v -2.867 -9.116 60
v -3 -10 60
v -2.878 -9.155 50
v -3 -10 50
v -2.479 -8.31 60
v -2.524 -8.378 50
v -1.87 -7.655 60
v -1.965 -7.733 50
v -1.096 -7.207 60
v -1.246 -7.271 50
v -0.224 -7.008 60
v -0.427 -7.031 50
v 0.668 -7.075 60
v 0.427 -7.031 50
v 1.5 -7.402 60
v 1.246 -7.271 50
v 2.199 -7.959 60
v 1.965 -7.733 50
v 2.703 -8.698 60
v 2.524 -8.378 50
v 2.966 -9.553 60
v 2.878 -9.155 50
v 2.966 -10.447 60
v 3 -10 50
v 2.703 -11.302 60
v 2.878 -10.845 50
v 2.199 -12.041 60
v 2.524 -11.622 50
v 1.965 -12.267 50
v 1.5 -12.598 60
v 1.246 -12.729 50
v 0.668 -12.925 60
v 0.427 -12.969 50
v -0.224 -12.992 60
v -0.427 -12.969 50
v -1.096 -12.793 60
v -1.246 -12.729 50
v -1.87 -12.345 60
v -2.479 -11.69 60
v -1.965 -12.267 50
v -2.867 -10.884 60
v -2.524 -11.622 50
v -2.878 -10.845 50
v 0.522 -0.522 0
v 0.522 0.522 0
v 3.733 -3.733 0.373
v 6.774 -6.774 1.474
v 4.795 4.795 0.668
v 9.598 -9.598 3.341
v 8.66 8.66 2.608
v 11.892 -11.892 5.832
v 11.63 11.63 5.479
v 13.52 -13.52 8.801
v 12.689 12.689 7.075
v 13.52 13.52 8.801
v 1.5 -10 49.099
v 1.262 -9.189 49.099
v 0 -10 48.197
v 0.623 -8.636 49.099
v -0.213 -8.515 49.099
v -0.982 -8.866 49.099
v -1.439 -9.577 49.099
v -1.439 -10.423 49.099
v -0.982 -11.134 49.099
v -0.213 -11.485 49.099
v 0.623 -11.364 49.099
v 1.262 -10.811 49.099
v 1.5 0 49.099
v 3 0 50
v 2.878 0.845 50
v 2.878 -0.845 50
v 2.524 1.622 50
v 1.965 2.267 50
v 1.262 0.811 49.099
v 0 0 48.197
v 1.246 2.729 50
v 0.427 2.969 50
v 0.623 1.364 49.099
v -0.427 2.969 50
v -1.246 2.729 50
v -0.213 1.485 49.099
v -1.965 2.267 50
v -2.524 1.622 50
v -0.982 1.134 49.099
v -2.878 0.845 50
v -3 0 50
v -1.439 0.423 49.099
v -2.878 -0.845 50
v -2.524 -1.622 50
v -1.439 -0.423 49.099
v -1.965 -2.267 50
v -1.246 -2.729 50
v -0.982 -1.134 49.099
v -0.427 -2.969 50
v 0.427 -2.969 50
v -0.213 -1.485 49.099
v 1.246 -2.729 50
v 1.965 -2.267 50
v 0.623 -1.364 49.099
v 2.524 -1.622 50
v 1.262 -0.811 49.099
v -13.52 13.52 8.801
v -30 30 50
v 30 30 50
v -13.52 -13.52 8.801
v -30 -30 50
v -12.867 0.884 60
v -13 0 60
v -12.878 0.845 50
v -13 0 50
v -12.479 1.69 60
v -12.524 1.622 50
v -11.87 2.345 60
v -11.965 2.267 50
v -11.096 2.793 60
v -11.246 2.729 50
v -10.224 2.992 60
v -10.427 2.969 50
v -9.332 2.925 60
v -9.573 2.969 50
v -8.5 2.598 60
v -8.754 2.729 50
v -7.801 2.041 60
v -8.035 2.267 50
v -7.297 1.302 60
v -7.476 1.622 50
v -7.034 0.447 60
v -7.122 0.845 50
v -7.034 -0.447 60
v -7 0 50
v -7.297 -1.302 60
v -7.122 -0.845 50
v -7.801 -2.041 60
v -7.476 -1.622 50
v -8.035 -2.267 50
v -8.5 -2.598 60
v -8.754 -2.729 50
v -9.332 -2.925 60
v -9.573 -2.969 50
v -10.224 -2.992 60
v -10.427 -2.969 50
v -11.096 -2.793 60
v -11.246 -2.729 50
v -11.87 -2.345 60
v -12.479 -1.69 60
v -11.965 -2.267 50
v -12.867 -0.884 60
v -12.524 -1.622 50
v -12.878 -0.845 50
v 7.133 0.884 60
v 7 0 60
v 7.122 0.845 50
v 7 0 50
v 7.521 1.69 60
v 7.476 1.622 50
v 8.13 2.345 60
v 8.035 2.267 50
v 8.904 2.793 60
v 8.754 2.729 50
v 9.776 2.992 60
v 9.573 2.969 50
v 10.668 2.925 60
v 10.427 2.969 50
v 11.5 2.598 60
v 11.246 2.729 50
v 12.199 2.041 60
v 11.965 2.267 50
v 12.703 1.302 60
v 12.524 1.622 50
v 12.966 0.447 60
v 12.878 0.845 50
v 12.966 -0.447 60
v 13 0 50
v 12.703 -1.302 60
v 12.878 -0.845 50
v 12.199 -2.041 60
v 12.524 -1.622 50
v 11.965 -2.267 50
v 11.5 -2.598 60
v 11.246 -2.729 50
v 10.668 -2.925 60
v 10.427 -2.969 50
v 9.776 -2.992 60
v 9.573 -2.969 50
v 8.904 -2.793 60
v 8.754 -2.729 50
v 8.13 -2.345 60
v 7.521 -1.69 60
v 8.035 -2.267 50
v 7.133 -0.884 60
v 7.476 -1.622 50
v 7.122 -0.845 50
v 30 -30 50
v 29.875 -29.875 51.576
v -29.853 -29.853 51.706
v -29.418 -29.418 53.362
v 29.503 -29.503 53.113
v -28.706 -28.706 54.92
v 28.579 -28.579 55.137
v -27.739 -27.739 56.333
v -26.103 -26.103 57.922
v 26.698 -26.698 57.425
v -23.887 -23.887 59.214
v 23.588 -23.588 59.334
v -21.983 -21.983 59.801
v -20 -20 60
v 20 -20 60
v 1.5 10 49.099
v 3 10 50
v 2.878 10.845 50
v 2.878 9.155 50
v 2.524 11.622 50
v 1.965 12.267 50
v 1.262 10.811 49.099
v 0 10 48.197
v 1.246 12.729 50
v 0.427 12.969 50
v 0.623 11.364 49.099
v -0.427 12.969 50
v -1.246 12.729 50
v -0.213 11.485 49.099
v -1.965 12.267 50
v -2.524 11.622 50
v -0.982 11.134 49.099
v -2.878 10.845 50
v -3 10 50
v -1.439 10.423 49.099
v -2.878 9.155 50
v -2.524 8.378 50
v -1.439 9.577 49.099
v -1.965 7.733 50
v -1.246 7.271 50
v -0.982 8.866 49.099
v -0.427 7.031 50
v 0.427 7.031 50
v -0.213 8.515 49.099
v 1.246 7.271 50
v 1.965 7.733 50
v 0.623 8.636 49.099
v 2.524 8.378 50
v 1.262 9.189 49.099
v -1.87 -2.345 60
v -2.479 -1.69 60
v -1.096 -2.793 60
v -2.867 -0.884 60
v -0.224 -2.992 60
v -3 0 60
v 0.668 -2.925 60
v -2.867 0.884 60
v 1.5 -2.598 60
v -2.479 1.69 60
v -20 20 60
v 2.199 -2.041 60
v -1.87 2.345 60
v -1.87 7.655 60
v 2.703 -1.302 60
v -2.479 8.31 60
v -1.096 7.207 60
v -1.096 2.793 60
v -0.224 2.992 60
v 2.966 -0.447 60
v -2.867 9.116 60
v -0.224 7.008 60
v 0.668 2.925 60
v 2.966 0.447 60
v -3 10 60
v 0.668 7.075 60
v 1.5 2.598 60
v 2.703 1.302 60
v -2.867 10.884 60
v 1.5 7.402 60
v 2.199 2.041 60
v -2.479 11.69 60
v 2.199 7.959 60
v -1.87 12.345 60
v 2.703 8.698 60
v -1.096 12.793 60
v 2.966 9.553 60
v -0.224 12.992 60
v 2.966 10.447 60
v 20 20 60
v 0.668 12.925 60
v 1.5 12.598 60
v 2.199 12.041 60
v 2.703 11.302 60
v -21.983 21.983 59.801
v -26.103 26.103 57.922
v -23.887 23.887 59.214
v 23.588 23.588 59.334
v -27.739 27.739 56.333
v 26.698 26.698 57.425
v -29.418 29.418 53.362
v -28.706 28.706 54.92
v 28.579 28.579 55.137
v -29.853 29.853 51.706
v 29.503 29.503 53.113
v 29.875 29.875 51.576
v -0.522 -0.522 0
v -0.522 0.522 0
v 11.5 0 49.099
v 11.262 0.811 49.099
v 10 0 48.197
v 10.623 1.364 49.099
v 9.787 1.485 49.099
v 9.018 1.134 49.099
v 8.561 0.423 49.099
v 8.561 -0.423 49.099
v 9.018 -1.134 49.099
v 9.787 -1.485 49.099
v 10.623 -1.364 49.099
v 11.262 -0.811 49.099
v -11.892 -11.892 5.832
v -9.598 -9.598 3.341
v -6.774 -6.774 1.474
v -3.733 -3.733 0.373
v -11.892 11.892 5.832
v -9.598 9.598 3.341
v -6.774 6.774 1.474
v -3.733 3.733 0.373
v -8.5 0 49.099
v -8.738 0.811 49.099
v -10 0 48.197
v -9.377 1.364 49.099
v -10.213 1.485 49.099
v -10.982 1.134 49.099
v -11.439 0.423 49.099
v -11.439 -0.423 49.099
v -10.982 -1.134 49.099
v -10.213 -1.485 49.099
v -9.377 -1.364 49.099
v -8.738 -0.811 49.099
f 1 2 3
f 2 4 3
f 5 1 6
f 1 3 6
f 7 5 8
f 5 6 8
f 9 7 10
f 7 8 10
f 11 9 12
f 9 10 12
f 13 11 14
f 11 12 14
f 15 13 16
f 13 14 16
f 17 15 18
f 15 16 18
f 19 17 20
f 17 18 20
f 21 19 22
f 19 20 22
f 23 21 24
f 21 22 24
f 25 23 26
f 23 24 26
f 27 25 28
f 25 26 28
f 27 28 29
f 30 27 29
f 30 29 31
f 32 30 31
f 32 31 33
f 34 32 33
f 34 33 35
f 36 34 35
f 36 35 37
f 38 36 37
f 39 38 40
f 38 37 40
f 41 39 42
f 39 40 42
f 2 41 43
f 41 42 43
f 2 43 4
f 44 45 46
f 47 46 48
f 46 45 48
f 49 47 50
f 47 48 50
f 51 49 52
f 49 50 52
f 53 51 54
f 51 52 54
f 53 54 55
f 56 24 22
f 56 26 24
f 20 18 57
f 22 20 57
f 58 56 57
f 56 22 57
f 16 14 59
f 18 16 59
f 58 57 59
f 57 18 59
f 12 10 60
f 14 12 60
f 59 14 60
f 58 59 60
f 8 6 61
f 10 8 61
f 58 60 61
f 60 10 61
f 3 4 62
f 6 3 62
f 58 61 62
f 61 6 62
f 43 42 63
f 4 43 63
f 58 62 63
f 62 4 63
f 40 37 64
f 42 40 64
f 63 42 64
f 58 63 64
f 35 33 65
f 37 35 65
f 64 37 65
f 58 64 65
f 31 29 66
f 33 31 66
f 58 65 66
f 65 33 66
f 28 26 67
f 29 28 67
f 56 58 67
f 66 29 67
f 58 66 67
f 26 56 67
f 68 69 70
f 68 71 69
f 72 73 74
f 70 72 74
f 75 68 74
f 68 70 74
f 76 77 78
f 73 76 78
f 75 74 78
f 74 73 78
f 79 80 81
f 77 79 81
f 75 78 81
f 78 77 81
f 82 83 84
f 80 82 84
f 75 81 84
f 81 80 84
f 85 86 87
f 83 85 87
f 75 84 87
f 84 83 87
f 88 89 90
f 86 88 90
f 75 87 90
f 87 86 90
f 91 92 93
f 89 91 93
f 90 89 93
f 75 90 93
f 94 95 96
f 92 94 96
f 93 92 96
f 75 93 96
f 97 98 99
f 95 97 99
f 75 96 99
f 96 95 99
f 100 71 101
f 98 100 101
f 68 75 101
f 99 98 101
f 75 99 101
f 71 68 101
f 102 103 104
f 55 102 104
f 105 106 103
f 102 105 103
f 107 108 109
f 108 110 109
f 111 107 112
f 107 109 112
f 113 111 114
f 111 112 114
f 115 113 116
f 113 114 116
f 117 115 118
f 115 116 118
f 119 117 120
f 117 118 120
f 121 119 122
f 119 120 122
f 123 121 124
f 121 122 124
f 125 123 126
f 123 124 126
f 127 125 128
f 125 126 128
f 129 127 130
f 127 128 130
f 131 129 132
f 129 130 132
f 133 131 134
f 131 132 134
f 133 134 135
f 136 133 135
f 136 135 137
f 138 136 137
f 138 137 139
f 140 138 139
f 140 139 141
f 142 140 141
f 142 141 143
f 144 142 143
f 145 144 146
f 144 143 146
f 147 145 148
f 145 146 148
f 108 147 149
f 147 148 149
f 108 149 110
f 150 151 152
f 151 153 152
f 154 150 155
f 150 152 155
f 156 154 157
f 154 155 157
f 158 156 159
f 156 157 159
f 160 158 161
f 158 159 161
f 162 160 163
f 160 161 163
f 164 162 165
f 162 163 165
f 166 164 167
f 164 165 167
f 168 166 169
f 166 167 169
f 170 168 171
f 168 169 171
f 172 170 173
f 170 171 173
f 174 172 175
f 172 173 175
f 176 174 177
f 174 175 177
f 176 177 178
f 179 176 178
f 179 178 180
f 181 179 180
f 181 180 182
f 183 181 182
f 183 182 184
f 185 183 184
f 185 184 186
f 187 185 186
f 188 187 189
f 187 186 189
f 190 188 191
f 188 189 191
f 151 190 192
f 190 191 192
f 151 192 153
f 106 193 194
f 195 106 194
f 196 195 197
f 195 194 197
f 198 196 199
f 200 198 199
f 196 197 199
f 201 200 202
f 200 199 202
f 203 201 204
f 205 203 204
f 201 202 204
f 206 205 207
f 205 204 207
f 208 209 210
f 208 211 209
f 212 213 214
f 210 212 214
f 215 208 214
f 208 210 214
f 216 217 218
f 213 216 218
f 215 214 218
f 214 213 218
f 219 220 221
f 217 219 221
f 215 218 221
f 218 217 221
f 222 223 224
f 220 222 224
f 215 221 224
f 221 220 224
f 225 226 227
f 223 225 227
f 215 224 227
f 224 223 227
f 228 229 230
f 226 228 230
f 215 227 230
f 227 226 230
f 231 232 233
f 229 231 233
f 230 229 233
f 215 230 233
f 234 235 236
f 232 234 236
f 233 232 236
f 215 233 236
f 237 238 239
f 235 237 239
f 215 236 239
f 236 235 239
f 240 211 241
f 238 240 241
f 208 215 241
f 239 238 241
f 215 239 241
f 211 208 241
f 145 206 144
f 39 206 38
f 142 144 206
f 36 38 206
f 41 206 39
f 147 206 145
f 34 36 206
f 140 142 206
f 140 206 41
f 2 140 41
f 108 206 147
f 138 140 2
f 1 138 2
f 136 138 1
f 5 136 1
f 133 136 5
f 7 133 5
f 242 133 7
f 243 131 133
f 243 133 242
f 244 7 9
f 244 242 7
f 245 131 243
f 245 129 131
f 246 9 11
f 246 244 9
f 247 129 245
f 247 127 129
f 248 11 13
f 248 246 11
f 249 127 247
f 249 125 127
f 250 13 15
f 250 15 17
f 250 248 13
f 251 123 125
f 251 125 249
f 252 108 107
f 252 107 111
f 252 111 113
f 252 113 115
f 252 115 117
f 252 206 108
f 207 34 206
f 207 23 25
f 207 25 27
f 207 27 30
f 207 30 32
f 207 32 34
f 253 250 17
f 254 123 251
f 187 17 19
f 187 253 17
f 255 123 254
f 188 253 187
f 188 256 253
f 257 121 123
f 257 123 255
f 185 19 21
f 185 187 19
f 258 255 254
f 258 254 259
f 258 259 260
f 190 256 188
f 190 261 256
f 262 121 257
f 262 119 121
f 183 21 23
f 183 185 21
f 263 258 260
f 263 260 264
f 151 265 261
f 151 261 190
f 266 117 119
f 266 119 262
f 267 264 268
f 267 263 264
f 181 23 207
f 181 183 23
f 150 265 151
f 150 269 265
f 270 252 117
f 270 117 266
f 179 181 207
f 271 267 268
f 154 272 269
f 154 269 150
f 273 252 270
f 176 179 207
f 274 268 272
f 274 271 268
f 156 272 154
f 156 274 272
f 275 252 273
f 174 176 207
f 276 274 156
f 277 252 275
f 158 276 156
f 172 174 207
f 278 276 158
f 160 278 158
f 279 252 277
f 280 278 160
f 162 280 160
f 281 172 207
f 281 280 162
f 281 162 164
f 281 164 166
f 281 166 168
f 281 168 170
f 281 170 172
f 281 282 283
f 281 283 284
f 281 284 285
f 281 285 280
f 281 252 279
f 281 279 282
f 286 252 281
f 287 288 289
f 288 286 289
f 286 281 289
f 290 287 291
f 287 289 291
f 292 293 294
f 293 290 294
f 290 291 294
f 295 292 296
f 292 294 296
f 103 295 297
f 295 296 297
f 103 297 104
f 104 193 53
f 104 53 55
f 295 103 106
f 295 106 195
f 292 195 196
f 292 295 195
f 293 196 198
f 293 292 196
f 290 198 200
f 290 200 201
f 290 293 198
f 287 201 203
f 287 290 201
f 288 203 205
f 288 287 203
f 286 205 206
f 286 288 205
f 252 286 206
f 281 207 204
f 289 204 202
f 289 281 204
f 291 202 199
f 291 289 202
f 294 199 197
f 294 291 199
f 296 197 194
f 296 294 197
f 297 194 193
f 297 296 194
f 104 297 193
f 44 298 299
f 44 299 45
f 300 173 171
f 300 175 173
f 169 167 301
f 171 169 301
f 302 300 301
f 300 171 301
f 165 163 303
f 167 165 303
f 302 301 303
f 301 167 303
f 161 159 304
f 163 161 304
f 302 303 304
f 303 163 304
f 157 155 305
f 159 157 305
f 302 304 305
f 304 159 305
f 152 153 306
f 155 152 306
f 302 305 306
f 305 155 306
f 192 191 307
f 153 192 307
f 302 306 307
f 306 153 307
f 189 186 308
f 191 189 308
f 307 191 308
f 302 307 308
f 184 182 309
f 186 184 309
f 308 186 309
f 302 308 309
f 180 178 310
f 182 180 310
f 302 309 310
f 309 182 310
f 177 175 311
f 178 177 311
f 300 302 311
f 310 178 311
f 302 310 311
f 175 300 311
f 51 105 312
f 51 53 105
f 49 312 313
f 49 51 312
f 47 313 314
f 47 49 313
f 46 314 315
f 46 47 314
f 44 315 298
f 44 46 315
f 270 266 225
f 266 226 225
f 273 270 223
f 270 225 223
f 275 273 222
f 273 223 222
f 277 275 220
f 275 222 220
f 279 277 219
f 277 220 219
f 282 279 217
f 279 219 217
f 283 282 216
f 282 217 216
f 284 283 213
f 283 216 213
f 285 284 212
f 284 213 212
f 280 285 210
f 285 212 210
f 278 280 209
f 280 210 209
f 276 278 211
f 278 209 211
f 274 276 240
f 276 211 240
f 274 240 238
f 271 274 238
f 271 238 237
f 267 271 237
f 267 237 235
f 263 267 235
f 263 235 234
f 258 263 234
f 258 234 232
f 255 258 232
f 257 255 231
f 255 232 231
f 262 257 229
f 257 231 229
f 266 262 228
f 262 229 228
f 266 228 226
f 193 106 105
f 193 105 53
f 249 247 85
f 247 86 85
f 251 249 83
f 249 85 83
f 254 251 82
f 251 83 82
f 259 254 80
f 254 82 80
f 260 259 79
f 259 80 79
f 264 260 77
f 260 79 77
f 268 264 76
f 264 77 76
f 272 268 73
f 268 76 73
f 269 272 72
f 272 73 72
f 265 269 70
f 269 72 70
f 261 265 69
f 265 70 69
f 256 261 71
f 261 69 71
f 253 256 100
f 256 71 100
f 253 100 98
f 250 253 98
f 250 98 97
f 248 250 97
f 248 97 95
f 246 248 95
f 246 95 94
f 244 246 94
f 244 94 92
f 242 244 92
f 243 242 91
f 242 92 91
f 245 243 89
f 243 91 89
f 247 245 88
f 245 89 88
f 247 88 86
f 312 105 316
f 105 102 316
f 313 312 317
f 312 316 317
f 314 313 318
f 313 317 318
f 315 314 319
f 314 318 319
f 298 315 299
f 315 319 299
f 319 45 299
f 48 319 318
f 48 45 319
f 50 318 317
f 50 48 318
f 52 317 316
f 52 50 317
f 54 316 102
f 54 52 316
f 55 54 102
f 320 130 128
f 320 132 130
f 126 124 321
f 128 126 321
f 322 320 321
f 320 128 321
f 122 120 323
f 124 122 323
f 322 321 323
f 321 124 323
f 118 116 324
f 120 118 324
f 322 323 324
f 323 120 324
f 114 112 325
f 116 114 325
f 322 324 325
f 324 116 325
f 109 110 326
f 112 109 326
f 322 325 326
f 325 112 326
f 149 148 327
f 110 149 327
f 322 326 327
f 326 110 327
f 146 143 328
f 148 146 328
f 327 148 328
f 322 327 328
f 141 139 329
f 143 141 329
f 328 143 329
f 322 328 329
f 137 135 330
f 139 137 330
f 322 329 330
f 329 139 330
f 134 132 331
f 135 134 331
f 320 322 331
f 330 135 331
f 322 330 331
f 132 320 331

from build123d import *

# Parameters (mm, degrees)
F0_W     = 60
F0_H     = 60
F1_DEPTH = 60
F3_D     = 6
F3_DEPTH = 10
F3_TIP   = 1.8025818571
F4_SIZE2 = 50
F4_SIZE  = 20
F5_R     = 14
F6_R     = 9.99999


# Not quite as in the source:
# - a fillet or chamfer is up to 0.001 mm smaller than in the source, because OpenCascade refuses the exact size


with BuildPart() as f1:
    # F0 (on Top) → F1 (new body)
    with BuildSketch(Plane.XY):
        Rectangle(F0_W, F0_H)
    extrude(amount=F1_DEPTH)

    # F3
    with Locations(Plane.XY.offset(60)):
        with Locations((0, 10), (-10, 0), (10, 0), (0, -10), (0, 0)):
            Hole(F3_D / 2, depth=F3_DEPTH)
            with Locations((0, 0, -(F3_DEPTH + F3_TIP / 2))):  # 118° drill point
                Cone(0, F3_D / 2, F3_TIP, mode=Mode.SUBTRACT)

    # F4
    f4_edges = [f1.edges().sort_by_distance(p)[0] for p in [
        (-30, 0, 0),
        (0, -30, 0),
        (30, 0, 0),
        (0, 30, 0),
    ]]
    f4_side = f1.faces().sort_by_distance((0, 0, 0))[0]
    chamfer(f4_edges, length=F4_SIZE, length2=F4_SIZE2, reference=f4_side)

    # F5
    f5_edges = [f1.edges().sort_by_distance(p)[0] for p in [
        (-10, 0, 0),
        (0, 10, 0),
        (0, -10, 0),
        (10, 0, 0),
    ]]
    fillet(f5_edges, radius=F5_R)

    # F6 (radius 10 in the source; OpenCascade refuses exactly that, so slightly less here)
    f6_edges = [f1.edges().sort_by_distance(p)[0] for p in [
        (-30, 0, 60),
        (0, 30, 60),
        (30, 0, 60),
        (0, -30, 60),
    ]]
    fillet(f6_edges, radius=F6_R)


solid = f1.part
